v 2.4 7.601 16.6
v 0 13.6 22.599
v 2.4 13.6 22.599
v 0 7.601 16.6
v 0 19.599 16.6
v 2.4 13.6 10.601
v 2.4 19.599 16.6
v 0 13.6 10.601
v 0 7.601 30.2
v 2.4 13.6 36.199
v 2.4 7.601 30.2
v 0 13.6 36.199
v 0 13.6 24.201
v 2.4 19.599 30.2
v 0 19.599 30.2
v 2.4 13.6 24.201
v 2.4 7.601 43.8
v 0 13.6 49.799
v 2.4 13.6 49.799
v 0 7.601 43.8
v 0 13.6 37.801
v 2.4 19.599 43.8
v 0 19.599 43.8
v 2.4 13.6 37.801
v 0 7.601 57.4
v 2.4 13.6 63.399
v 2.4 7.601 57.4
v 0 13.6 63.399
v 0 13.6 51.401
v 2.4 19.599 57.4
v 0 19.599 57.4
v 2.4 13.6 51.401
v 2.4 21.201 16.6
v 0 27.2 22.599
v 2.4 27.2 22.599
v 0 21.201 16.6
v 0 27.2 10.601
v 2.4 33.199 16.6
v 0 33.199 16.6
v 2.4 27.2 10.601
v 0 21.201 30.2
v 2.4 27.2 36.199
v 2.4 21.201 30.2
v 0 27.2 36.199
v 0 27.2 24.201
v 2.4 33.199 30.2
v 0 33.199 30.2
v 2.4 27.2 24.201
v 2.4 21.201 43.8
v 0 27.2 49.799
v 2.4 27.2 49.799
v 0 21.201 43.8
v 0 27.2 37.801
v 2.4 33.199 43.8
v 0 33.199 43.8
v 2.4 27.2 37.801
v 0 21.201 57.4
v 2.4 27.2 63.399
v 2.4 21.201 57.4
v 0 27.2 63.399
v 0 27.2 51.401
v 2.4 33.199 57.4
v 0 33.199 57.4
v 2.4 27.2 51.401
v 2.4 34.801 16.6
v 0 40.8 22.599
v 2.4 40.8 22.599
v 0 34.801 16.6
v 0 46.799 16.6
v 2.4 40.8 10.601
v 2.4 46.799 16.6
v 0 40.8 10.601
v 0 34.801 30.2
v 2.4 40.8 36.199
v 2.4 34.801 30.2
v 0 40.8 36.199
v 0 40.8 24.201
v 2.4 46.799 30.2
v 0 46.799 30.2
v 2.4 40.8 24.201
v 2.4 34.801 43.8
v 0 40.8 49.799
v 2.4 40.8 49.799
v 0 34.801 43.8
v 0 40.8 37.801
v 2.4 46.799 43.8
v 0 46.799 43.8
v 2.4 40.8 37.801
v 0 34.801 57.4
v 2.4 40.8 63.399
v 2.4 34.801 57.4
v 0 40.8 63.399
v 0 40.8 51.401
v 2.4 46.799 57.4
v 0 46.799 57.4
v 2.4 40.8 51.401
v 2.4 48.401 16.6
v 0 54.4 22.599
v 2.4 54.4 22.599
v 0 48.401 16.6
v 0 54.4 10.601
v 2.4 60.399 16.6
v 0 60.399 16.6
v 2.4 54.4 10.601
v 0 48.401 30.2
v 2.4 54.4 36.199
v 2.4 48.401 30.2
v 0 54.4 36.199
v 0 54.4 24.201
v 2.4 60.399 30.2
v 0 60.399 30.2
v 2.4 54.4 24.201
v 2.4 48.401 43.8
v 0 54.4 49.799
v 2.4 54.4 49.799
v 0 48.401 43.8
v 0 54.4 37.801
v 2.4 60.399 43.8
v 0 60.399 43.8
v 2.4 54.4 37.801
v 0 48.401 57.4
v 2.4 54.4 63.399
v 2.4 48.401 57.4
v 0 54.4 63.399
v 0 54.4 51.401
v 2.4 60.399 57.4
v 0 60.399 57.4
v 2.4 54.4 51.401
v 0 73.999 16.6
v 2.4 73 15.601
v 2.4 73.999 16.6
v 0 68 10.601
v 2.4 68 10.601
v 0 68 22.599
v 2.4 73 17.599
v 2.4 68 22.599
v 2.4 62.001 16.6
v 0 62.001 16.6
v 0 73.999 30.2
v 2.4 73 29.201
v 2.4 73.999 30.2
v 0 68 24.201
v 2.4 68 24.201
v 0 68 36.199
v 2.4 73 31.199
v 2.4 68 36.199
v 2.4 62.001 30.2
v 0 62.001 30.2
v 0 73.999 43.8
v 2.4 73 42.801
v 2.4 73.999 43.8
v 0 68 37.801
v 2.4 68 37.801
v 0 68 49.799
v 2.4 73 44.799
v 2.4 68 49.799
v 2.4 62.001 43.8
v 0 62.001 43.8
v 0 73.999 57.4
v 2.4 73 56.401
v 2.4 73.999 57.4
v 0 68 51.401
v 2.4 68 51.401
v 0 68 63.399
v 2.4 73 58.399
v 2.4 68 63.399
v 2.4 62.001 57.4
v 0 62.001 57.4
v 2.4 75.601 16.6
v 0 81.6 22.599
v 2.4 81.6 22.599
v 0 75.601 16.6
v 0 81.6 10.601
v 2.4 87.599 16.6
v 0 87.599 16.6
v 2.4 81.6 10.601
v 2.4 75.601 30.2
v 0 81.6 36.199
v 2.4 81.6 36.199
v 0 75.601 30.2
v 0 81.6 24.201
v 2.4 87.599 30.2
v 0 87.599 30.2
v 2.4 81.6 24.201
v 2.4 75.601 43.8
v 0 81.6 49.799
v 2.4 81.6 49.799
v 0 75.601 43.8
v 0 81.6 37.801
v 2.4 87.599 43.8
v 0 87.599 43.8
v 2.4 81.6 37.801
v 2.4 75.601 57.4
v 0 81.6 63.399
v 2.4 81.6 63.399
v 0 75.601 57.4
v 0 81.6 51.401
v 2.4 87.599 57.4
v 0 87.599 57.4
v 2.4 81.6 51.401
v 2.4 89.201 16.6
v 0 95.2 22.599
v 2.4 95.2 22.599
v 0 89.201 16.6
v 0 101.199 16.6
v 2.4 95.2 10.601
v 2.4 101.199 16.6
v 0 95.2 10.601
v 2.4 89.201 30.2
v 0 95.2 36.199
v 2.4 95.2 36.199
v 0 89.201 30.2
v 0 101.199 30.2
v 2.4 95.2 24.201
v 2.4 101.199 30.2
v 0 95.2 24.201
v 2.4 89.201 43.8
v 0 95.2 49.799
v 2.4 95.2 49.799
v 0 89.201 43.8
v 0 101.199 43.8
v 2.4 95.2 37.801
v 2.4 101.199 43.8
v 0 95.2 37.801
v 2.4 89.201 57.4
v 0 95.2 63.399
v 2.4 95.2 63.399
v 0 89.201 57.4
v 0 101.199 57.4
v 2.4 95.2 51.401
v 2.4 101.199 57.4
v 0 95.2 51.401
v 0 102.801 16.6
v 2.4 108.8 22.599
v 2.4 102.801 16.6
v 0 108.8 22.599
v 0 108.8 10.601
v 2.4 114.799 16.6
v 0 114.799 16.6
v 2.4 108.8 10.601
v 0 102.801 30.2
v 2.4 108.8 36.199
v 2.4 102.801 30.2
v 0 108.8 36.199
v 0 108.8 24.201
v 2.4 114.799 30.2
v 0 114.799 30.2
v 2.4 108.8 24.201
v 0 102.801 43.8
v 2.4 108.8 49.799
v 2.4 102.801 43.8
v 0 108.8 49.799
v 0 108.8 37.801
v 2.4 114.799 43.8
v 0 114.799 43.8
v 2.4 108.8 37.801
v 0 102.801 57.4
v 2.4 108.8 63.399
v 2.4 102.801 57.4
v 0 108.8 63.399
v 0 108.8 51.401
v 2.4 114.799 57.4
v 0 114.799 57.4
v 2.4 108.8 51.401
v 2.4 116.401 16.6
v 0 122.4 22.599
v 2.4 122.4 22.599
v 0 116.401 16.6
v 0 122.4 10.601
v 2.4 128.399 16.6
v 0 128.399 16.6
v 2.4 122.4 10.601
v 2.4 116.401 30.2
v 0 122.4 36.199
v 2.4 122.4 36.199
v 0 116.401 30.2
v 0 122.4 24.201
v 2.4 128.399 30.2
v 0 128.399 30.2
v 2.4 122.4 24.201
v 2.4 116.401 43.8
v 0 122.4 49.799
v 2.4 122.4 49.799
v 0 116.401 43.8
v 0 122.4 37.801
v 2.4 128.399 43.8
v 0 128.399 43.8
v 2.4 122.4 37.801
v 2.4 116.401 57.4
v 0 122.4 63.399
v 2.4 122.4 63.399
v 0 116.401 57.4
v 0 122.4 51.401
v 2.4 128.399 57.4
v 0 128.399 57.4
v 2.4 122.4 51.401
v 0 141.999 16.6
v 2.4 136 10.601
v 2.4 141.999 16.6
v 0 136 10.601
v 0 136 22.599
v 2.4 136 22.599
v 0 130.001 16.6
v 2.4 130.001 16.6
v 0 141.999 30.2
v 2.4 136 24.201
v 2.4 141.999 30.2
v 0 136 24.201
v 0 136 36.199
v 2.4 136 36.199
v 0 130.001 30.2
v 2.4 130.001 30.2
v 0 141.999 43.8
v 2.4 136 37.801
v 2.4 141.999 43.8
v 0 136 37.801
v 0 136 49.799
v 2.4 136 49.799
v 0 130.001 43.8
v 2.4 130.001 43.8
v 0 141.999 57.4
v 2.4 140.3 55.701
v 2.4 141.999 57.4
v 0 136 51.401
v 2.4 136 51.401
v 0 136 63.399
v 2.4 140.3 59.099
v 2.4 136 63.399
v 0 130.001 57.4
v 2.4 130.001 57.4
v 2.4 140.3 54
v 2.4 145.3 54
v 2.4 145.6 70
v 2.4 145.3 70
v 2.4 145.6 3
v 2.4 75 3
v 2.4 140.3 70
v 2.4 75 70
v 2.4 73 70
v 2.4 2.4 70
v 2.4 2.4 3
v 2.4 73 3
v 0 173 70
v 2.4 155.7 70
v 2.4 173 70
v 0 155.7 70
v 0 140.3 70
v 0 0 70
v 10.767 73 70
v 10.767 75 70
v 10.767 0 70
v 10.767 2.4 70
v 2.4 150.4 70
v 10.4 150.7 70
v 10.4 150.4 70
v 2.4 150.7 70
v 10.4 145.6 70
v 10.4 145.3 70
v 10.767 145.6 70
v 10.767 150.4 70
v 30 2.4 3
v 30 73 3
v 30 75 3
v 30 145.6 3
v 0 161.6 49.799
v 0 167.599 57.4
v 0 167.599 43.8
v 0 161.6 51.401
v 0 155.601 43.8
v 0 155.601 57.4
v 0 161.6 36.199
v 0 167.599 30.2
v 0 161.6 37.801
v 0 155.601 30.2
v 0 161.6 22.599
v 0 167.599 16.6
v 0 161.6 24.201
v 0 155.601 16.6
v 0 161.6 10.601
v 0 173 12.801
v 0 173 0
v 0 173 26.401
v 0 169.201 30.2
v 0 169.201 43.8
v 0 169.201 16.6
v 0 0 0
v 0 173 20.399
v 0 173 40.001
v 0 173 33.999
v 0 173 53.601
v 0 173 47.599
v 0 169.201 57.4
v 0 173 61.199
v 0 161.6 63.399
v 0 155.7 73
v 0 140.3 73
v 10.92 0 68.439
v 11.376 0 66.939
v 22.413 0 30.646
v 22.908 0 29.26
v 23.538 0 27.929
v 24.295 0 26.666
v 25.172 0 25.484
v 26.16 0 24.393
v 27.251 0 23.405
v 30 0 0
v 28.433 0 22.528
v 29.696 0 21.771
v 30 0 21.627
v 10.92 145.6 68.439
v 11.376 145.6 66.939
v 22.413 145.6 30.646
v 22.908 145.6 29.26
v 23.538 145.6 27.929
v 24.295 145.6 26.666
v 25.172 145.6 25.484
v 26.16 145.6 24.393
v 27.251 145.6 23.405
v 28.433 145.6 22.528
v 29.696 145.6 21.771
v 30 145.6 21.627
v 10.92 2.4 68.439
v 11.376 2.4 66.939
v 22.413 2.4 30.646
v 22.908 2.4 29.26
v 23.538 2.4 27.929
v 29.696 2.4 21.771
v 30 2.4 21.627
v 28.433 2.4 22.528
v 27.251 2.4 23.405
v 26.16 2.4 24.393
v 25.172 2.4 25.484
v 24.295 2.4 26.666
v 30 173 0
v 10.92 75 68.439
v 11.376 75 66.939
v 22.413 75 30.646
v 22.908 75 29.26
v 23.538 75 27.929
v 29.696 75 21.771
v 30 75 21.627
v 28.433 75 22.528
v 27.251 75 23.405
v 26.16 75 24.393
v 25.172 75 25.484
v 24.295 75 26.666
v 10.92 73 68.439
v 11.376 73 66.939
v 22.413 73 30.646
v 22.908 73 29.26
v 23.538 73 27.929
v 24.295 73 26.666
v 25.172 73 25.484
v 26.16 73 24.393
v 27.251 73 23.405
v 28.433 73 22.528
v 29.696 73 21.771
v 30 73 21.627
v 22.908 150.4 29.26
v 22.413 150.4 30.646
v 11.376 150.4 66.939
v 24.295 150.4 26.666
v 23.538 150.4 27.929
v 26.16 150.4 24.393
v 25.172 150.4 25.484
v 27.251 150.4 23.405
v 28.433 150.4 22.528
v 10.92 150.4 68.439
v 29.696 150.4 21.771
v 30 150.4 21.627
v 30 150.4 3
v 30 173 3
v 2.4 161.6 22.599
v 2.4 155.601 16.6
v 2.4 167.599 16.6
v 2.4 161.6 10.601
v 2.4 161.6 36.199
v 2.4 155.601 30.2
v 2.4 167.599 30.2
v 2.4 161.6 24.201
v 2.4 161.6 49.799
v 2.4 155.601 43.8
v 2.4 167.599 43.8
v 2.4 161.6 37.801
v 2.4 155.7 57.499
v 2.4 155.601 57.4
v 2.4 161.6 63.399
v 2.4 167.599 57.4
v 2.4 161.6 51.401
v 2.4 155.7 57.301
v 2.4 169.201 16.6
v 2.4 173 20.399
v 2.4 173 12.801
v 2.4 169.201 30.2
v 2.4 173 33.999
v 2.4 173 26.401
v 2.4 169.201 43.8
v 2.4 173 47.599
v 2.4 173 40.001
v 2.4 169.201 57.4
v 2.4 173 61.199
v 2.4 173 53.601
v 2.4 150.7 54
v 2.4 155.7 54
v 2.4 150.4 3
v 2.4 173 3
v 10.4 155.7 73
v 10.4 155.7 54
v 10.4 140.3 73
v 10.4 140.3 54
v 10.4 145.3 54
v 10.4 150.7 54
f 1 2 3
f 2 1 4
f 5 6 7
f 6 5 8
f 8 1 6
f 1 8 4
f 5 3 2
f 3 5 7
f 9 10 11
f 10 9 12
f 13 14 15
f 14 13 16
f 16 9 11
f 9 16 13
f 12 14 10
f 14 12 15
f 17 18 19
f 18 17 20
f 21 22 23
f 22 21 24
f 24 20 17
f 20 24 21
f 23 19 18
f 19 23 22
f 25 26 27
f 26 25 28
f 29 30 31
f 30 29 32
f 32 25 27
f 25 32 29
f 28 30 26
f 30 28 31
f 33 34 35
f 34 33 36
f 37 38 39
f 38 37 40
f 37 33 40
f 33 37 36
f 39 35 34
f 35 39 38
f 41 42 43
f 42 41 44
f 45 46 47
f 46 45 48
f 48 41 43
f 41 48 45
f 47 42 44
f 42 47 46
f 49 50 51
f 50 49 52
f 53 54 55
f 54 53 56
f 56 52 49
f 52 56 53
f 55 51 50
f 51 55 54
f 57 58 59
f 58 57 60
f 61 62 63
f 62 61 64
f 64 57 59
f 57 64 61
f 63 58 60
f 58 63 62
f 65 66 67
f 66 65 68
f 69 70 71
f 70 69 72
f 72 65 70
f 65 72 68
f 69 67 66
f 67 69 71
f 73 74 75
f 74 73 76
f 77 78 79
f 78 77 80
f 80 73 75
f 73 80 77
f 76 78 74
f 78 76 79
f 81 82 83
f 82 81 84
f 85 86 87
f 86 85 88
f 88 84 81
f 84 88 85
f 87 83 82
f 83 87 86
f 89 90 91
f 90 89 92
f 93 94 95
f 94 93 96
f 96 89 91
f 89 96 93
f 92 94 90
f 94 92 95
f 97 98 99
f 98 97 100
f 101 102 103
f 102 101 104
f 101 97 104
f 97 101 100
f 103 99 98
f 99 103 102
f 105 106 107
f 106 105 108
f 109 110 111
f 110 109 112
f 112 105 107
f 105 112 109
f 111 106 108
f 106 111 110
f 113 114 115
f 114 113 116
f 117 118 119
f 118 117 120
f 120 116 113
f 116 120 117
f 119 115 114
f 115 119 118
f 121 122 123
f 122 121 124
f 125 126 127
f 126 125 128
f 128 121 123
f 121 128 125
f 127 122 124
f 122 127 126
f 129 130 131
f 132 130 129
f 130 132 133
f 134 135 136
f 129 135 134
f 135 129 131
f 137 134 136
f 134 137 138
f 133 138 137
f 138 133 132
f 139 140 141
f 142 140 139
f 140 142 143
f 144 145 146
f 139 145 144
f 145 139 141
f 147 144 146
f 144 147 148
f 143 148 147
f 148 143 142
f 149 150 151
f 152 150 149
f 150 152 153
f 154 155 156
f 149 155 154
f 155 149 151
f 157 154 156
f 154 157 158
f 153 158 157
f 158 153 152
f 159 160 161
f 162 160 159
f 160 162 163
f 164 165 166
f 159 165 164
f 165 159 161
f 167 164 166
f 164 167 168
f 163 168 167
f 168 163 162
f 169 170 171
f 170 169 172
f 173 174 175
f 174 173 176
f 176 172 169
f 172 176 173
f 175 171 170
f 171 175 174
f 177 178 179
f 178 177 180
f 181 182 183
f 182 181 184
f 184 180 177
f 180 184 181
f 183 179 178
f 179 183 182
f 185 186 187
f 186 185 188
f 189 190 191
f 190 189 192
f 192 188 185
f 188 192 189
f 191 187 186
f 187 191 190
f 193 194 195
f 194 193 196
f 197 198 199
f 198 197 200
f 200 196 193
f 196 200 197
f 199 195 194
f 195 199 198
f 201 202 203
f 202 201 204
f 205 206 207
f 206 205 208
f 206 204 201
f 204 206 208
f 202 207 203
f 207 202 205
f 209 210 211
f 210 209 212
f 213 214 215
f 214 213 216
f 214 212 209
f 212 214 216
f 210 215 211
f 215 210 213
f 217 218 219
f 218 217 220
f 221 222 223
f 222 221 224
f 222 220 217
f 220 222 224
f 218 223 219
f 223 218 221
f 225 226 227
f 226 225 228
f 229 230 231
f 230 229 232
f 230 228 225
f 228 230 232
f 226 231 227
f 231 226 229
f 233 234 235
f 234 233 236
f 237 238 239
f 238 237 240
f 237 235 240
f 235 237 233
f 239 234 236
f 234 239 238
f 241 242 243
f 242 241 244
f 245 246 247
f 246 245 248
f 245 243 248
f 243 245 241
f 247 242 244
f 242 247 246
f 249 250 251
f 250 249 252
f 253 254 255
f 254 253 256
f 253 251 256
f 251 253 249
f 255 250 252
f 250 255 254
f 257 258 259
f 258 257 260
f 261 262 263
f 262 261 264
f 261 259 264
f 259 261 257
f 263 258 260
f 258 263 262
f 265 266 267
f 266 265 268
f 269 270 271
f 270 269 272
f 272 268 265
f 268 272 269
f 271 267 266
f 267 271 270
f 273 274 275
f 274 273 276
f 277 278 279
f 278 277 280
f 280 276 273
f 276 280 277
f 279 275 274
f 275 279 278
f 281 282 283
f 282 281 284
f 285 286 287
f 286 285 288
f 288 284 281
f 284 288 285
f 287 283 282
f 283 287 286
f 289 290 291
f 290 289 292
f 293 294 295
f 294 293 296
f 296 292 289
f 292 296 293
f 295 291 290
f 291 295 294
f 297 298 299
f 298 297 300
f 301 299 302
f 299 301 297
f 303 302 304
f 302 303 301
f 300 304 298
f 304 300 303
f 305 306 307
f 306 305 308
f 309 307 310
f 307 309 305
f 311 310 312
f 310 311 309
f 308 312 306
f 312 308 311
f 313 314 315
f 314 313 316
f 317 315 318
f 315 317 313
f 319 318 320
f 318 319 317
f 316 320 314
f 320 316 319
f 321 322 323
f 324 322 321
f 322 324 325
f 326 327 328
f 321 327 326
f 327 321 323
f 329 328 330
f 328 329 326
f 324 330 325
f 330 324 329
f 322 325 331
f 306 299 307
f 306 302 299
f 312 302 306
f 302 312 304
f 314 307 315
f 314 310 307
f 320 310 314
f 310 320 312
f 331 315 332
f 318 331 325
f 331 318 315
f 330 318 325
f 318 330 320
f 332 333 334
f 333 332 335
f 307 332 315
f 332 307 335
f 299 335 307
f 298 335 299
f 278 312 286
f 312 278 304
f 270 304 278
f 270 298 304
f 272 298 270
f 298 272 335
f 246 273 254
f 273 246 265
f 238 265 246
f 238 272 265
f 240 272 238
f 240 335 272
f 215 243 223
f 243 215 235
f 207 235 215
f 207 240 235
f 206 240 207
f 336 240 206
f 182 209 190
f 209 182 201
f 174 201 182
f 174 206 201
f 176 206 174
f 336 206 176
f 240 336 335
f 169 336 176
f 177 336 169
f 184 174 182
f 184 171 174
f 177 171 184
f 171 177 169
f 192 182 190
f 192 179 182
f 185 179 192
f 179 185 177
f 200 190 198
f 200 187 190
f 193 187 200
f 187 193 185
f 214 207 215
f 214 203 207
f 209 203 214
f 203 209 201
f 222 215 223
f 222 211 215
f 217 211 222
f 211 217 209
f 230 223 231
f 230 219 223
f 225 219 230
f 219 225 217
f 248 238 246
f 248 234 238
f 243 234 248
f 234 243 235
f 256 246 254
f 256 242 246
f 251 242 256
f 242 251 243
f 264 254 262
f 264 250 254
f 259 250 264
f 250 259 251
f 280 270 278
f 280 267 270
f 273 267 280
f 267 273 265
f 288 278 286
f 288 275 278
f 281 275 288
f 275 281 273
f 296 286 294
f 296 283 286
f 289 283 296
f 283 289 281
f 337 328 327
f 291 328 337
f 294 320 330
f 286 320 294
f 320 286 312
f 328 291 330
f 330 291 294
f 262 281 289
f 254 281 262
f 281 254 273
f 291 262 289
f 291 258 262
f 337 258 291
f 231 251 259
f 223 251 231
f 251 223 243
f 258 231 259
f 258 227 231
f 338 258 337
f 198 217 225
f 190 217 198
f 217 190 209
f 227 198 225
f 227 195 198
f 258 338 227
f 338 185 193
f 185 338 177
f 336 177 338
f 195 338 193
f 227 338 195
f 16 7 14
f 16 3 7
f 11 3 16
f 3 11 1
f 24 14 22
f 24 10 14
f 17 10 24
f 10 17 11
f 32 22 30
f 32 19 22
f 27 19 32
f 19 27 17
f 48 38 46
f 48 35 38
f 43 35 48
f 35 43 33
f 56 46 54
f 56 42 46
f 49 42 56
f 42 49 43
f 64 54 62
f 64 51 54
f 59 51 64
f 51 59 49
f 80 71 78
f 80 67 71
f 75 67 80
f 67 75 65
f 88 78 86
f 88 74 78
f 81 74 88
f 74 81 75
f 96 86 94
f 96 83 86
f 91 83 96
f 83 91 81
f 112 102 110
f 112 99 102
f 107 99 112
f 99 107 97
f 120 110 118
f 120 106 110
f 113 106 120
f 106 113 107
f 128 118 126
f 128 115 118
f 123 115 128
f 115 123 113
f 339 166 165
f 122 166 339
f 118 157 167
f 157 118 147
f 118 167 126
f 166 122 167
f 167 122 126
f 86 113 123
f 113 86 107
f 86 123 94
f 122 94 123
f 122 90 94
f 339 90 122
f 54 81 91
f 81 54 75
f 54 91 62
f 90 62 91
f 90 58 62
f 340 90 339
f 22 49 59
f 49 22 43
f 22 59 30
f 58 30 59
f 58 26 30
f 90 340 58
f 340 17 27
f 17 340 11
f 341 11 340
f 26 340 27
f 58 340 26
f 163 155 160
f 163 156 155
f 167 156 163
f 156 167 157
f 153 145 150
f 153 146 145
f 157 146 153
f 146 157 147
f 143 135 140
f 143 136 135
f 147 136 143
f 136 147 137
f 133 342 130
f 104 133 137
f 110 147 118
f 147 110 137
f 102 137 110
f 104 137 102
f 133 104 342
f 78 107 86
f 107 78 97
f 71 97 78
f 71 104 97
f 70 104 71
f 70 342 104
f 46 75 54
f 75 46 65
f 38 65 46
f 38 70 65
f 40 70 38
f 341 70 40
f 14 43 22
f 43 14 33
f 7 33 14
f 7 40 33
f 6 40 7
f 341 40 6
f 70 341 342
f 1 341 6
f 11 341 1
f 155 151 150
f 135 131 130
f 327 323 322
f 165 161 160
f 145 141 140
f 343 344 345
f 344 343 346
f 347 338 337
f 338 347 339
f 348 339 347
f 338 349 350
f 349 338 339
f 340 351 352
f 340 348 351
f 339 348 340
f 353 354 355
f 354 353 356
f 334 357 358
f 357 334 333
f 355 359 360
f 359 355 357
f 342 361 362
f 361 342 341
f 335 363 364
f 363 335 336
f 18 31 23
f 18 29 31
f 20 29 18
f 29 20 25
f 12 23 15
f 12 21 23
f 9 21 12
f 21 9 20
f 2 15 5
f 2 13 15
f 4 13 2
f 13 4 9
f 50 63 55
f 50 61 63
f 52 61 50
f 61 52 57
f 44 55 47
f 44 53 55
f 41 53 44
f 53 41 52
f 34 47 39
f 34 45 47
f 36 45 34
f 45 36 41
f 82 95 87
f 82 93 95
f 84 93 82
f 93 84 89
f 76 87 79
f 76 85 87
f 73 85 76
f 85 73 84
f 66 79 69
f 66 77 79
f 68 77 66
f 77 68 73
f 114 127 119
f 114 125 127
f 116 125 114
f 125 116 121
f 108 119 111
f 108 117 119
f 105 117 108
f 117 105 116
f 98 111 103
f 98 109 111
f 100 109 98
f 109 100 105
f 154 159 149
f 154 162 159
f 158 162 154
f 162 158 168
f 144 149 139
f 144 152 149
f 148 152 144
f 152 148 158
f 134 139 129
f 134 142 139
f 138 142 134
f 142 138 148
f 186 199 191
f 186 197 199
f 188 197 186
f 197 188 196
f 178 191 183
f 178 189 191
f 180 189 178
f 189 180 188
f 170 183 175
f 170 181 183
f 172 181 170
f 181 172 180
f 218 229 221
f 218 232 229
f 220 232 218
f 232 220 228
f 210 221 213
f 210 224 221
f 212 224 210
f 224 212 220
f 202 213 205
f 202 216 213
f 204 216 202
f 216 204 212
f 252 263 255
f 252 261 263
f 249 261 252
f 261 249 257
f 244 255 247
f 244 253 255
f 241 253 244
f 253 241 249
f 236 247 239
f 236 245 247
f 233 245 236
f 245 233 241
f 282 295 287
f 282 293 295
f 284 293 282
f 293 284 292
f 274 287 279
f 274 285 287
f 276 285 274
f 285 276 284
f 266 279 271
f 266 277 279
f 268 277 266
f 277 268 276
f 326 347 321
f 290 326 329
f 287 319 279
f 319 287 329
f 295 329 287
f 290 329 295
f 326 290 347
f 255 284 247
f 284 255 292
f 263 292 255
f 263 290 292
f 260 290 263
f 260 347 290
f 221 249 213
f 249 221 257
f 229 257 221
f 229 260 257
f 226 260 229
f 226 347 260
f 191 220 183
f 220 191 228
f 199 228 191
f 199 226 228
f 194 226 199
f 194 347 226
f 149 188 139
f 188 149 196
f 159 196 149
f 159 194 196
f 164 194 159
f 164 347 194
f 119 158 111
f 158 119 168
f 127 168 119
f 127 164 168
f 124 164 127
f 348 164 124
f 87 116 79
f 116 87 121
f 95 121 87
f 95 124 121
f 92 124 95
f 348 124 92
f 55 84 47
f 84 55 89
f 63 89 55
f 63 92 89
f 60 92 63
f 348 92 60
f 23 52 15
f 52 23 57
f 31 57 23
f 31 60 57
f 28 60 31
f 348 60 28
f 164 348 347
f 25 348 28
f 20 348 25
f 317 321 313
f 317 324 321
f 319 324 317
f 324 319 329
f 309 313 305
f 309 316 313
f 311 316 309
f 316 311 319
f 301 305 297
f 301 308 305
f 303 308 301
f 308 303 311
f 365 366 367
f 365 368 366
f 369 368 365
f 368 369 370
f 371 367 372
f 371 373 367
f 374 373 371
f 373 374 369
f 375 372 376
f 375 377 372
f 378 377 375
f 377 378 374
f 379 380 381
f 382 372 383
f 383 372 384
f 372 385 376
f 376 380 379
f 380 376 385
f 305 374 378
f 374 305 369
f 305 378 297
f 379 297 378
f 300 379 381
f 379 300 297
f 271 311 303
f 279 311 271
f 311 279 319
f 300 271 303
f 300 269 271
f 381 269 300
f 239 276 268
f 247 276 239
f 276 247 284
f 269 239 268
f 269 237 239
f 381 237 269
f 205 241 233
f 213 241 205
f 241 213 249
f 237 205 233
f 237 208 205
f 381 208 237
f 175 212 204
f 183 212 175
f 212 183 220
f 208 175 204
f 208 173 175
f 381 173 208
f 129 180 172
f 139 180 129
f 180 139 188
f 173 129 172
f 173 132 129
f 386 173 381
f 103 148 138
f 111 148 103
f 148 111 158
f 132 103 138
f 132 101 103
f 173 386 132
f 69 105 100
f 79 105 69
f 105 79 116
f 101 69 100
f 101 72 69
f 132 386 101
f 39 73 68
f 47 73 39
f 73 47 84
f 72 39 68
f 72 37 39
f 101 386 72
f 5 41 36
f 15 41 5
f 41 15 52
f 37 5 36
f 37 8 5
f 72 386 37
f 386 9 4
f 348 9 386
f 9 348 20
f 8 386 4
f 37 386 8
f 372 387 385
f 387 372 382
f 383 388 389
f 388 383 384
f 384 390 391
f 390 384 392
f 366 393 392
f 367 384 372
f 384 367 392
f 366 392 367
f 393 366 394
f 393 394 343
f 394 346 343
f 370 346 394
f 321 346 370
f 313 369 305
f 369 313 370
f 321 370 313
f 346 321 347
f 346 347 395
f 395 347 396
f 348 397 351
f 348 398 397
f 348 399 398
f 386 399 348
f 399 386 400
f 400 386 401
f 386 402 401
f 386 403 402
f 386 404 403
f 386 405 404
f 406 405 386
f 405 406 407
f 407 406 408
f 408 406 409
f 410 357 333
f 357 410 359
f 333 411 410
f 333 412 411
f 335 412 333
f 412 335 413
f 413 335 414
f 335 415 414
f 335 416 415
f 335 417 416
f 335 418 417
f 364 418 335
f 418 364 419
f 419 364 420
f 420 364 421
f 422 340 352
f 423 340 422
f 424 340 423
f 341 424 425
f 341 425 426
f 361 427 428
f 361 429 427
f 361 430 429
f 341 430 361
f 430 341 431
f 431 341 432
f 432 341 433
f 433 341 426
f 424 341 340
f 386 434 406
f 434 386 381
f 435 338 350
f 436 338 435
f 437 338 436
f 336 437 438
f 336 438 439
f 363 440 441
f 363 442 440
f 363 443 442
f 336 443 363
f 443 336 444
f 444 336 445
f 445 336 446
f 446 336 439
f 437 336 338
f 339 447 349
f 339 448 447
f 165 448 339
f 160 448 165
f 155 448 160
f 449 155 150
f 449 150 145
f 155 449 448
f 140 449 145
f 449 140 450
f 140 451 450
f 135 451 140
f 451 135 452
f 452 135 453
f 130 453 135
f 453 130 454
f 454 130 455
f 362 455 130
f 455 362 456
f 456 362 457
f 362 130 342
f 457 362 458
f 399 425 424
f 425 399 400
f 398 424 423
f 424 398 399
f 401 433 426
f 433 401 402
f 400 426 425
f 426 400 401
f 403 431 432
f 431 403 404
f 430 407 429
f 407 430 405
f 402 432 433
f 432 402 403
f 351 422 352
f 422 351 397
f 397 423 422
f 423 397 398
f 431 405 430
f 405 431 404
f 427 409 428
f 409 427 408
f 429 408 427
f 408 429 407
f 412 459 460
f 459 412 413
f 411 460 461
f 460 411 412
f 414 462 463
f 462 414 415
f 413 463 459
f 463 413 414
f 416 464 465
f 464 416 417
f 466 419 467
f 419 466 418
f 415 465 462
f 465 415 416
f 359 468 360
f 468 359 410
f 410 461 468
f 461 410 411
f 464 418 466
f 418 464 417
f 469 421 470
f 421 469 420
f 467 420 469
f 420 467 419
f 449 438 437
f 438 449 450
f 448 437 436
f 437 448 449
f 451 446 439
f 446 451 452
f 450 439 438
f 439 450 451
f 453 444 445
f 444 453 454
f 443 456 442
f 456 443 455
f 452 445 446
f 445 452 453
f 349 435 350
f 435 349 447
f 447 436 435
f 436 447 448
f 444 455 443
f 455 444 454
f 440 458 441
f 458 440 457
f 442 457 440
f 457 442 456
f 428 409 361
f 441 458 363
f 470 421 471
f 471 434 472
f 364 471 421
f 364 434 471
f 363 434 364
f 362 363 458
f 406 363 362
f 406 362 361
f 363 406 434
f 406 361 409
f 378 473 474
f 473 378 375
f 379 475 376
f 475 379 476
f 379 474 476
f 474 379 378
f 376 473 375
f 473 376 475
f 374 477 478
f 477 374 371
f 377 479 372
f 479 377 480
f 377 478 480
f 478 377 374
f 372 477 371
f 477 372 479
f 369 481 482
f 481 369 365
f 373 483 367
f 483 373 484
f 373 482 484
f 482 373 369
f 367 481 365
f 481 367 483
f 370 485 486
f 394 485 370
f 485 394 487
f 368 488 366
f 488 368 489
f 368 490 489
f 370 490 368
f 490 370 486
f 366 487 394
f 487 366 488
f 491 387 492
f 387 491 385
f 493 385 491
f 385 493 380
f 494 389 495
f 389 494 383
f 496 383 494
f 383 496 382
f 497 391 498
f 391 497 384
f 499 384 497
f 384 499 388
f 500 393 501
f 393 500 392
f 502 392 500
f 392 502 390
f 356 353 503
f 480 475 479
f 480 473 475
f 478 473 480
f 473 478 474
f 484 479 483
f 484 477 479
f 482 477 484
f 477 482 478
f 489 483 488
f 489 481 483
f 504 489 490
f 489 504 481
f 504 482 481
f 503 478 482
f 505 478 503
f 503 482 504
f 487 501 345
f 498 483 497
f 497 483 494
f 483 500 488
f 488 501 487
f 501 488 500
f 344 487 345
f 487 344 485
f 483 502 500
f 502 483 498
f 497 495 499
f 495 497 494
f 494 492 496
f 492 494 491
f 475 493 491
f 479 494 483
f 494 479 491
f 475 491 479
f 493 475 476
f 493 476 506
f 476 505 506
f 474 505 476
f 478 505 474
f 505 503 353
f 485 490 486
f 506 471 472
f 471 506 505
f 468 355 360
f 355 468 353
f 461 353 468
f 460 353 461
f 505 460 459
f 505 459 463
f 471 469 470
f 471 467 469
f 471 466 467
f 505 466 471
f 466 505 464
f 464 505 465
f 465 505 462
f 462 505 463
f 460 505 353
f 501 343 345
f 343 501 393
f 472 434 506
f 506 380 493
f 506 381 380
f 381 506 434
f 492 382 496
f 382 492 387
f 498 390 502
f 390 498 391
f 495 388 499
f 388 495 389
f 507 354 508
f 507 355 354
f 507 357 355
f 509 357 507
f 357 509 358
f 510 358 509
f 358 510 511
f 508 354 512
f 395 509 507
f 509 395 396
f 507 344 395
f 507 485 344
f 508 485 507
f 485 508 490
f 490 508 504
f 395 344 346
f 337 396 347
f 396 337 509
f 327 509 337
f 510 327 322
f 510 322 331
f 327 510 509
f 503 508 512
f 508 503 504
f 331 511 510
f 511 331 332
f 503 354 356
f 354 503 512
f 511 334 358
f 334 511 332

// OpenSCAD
// file: lattice_wall.scad
// lattice_wall.scad

// Front/back walls: run along X, thickness in Y, height in Z
module lattice_wall(len, ht, thick, gap=12, strand=1.6) {
    pitch = gap + strand;
    difference() {
        cube([len, thick, ht]);
        for (xi = [pitch : pitch : len - pitch/2],
             zi = [pitch : pitch : ht  - pitch/2])
            // Centre cut in wall thickness so it pierces all the way through
            translate([xi, thick/2, zi])
                rotate([0, 45, 0])
                    cube([gap*0.707, thick+0.4, gap*0.707], center=true);
    }
}

// Side walls: run along Y, thickness in X, height in Z
module lattice_wall_y(len, ht, thick, gap=12, strand=1.6) {
    pitch = gap + strand;
    difference() {
        cube([thick, len, ht]);
        for (yi = [pitch : pitch : len - pitch/2],
             zi = [pitch : pitch : ht  - pitch/2])
            translate([thick/2, yi, zi])
                rotate([45, 0, 0])
                    cube([thick+0.4, gap*0.707, gap*0.707], center=true);
    }
}
// file: caddy_params.scad
use <lattice_wall.scad>

// --- Overall dimensions ---
total_w = 215;
half_d  = 148;
wall_h  = 70;
cols    = 3;
rows    = 2;
ow      = 2.4;    // outer wall thickness
dt      = 2.0;    // divider thickness
bt      = 3.0;    // base thickness

cell_w = (total_w - 2*ow - (cols-1)*dt) / cols;
cell_d = (half_d  - 2*ow - dt) / rows;

// --- Lattice (side walls only) ---
lat_gap    = 12;
lat_strand = 1.6;

// --- Finger-cutout geometry ---
// Profile Y=0 is arc centre; arc dips to Y=-uc_bot_w/2.
// uc_z_off maps profile-Y to world-Z: world-Z = profile-Y + uc_z_off
//   arc bottom  world-Z = uc_z_off - uc_bot_w/2 = 35 - 15 = 20 mm
//   top of profile world-Z = 35 + 40 = 75 > wall_h = 70 (guaranteed open)
uc_bot_w = 30;    // bottom semicircle diameter
uc_top_w = 36;    // distance between top-corner circle centres
uc_cr    = 8;     // top-corner circle radius (also controls how far above wall the cut exits)
uc_z_off = 35;    // Z offset: arc bottom lands at Z = uc_z_off - uc_bot_w/2 = 20

// Profile-Y at wall top (world-Z = wall_h = 70)
uc_y_wt  = wall_h - uc_z_off;   // = 35

// --- Tongue/groove joint ---
tl  = 40;
th  = 10;
tt  = 5;
tol = 0.5;

// Back half centre tongue — sized to fit as-printed front groove (30mm wide, 11mm tall, ~2.5mm deep)
tl_c = 28;   // 1mm clearance each side of 30mm opening
th_c = 9;    // 1mm clearance each side of 11mm opening
tt_c = 2;    // conservative fit for ~2.5mm groove depth

function ccx(i) = ow + i*(cell_w + dt) + cell_w/2;

tx1 = ow + cell_w + dt/2;
tx2 = ow + 2*(cell_w + dt) - dt/2;
tx_c = total_w / 2;

// --- 2-D U-profile ---
// Hull of bottom half-circle + two side circles at wall-top level.
// The side circles are centred at (+-uc_top_w/2, uc_y_wt) -- IN the solid
// wall material -- so the hull curve sweeps smoothly from solid into U.
// Profile is widest at uc_y_wt (wall top) and tapers down to uc_bot_w.
// Circles reach Y = uc_y_wt + uc_cr = 43, mapping to world-Z = 78 > 70
// so the cut is guaranteed to break through the wall top with no hard edge.
module u_profile_2d() {
    hull() {
        // Bottom half-circle (dips below Y=0)
        intersection() {
            circle(r = uc_bot_w/2, $fn = 64);
            translate([-(uc_bot_w/2 + 1), -uc_bot_w])
                square([uc_bot_w + 2, uc_bot_w]);
        }
        // Top-corner circles: centres in solid wall, arcs sweep into U
        translate([ uc_top_w/2, uc_y_wt]) circle(r = uc_cr, $fn = 32);
        translate([-uc_top_w/2, uc_y_wt]) circle(r = uc_cr, $fn = 32);
    }
}

// --- 3-D cutout through wall of thickness wt ---
module u_cut(wt) {
    translate([0, wt + 0.1, uc_z_off])
        rotate([90, 0, 0])
            linear_extrude(wt + 0.2)
                u_profile_2d();
}

// --- Half-tray ---
// Front/back walls: SOLID (U cutouts print better in solid walls)
// Side walls: lattice (no cutouts, decorative/lightweight)
// 2+1 tongue scheme:
//   Front: 2 tongues (tx1,tx2) + 1 centre groove
//   Back:  2 grooves (tx1,tx2) + 1 centre tongue
module caddy_half(is_front = true) {
    wy_back = half_d - ow;
    wy_div  = ow + cell_d;

    difference() {
        union() {
            // Base
            cube([total_w, half_d, bt]);
            // Front outer wall -- SOLID
            translate([0, 0, bt])
                cube([total_w, ow, wall_h - bt]);
            // Back outer wall -- SOLID
            translate([0, wy_back, bt])
                cube([total_w, ow, wall_h - bt]);
            // Left side wall -- LATTICE
            translate([0, 0, bt])
                lattice_wall_y(half_d, wall_h - bt, ow, lat_gap, lat_strand);
            // Right side wall -- LATTICE
            translate([total_w - ow, 0, bt])
                lattice_wall_y(half_d, wall_h - bt, ow, lat_gap, lat_strand);
            // Vertical column dividers (solid)
            for (i = [1 : cols-1])
                translate([ow + i*(cell_w + dt) - dt/2, ow, bt])
                    cube([dt, half_d - 2*ow, wall_h - bt]);
            // Horizontal row divider (solid)
            translate([ow, wy_div, bt])
                cube([total_w - 2*ow, dt, wall_h - bt]);

            // Joint geometry
            if (is_front) {
                translate([tx1 - tl/2, half_d,         bt+3]) cube([tl, tt,    th]);
                translate([tx2 - tl/2, half_d,         bt+3]) cube([tl, tt,    th]);
                translate([tx_c - tl/2, half_d - tt*2, bt+3]) cube([tl, tt*2,  th]);
            } else {
                translate([tx1 - tl/2, 0, bt+3]) cube([tl, tt*2, th]);
                translate([tx2 - tl/2, 0, bt+3]) cube([tl, tt*2, th]);
                translate([tx_c - tl_c/2, -tt_c, bt+3]) cube([tl_c, tt_c, th_c]);
            }
        }

        // U cutouts
        for (i = [0 : cols-1]) translate([ccx(i), 0,       0]) u_cut(ow);
        for (i = [0 : cols-1]) translate([ccx(i), wy_back, 0]) u_cut(ow);
        for (i = [0 : cols-1]) translate([ccx(i), wy_div,  0]) u_cut(dt);

        // Groove cuts
        if (is_front) {
            translate([tx_c - tl/2 - tol, half_d - tt - tol, bt+3 - tol])
                cube([tl + 2*tol, tt + tol + 0.1, th + 2*tol]);
        } else {
            translate([tx1 - tl/2 - tol, -0.1, bt+3 - tol])
                cube([tl + 2*tol, tt + tol, th + 2*tol]);
            translate([tx2 - tl/2 - tol, -0.1, bt+3 - tol])
                cube([tl + 2*tol, tt + tol, th + 2*tol]);
        }
    }
}
// main file
// Clip-on-corner context view -- visual check only, do NOT print
include <caddy_params.scad>

cy_gap   = 2*ow + 0.6;
cy_t     = 5.0;
cy_y     = 2*cy_t + cy_gap;
leg_x    = 8.0;
clip_bt  = 3.0;
clip_leg = 16.0;
clip_h   = clip_bt + clip_leg;

module bridge_clip() {
    difference() {
        union() {
            cube([ow + leg_x, cy_y, clip_bt]);
            translate([ow, 0, 0])
                cube([leg_x, cy_y, clip_h]);
        }
        translate([ow - 0.1, cy_t, clip_bt])
            cube([leg_x + 0.2, cy_gap, clip_leg + 1]);
    }
}

// Front half -- left corner + seam region only
intersection() {
    caddy_half(is_front = true);
    cube([30, half_d, wall_h]);
}

// Back half -- left corner + seam region only
translate([0, half_d, 0])
intersection() {
    caddy_half(is_front = false);
    cube([30, 25, wall_h]);
}

// Left clip in installed position:
// bridge overhangs side wall (x=0..ow), legs hang down inside (x=ow..ow+leg_x)
// bridge sits above wall_h, legs descend into corner
translate([0, half_d - cy_t - cy_gap/2, wall_h + clip_bt])
    mirror([0, 0, 1])
        color("red", 0.8)
            bridge_clip();
